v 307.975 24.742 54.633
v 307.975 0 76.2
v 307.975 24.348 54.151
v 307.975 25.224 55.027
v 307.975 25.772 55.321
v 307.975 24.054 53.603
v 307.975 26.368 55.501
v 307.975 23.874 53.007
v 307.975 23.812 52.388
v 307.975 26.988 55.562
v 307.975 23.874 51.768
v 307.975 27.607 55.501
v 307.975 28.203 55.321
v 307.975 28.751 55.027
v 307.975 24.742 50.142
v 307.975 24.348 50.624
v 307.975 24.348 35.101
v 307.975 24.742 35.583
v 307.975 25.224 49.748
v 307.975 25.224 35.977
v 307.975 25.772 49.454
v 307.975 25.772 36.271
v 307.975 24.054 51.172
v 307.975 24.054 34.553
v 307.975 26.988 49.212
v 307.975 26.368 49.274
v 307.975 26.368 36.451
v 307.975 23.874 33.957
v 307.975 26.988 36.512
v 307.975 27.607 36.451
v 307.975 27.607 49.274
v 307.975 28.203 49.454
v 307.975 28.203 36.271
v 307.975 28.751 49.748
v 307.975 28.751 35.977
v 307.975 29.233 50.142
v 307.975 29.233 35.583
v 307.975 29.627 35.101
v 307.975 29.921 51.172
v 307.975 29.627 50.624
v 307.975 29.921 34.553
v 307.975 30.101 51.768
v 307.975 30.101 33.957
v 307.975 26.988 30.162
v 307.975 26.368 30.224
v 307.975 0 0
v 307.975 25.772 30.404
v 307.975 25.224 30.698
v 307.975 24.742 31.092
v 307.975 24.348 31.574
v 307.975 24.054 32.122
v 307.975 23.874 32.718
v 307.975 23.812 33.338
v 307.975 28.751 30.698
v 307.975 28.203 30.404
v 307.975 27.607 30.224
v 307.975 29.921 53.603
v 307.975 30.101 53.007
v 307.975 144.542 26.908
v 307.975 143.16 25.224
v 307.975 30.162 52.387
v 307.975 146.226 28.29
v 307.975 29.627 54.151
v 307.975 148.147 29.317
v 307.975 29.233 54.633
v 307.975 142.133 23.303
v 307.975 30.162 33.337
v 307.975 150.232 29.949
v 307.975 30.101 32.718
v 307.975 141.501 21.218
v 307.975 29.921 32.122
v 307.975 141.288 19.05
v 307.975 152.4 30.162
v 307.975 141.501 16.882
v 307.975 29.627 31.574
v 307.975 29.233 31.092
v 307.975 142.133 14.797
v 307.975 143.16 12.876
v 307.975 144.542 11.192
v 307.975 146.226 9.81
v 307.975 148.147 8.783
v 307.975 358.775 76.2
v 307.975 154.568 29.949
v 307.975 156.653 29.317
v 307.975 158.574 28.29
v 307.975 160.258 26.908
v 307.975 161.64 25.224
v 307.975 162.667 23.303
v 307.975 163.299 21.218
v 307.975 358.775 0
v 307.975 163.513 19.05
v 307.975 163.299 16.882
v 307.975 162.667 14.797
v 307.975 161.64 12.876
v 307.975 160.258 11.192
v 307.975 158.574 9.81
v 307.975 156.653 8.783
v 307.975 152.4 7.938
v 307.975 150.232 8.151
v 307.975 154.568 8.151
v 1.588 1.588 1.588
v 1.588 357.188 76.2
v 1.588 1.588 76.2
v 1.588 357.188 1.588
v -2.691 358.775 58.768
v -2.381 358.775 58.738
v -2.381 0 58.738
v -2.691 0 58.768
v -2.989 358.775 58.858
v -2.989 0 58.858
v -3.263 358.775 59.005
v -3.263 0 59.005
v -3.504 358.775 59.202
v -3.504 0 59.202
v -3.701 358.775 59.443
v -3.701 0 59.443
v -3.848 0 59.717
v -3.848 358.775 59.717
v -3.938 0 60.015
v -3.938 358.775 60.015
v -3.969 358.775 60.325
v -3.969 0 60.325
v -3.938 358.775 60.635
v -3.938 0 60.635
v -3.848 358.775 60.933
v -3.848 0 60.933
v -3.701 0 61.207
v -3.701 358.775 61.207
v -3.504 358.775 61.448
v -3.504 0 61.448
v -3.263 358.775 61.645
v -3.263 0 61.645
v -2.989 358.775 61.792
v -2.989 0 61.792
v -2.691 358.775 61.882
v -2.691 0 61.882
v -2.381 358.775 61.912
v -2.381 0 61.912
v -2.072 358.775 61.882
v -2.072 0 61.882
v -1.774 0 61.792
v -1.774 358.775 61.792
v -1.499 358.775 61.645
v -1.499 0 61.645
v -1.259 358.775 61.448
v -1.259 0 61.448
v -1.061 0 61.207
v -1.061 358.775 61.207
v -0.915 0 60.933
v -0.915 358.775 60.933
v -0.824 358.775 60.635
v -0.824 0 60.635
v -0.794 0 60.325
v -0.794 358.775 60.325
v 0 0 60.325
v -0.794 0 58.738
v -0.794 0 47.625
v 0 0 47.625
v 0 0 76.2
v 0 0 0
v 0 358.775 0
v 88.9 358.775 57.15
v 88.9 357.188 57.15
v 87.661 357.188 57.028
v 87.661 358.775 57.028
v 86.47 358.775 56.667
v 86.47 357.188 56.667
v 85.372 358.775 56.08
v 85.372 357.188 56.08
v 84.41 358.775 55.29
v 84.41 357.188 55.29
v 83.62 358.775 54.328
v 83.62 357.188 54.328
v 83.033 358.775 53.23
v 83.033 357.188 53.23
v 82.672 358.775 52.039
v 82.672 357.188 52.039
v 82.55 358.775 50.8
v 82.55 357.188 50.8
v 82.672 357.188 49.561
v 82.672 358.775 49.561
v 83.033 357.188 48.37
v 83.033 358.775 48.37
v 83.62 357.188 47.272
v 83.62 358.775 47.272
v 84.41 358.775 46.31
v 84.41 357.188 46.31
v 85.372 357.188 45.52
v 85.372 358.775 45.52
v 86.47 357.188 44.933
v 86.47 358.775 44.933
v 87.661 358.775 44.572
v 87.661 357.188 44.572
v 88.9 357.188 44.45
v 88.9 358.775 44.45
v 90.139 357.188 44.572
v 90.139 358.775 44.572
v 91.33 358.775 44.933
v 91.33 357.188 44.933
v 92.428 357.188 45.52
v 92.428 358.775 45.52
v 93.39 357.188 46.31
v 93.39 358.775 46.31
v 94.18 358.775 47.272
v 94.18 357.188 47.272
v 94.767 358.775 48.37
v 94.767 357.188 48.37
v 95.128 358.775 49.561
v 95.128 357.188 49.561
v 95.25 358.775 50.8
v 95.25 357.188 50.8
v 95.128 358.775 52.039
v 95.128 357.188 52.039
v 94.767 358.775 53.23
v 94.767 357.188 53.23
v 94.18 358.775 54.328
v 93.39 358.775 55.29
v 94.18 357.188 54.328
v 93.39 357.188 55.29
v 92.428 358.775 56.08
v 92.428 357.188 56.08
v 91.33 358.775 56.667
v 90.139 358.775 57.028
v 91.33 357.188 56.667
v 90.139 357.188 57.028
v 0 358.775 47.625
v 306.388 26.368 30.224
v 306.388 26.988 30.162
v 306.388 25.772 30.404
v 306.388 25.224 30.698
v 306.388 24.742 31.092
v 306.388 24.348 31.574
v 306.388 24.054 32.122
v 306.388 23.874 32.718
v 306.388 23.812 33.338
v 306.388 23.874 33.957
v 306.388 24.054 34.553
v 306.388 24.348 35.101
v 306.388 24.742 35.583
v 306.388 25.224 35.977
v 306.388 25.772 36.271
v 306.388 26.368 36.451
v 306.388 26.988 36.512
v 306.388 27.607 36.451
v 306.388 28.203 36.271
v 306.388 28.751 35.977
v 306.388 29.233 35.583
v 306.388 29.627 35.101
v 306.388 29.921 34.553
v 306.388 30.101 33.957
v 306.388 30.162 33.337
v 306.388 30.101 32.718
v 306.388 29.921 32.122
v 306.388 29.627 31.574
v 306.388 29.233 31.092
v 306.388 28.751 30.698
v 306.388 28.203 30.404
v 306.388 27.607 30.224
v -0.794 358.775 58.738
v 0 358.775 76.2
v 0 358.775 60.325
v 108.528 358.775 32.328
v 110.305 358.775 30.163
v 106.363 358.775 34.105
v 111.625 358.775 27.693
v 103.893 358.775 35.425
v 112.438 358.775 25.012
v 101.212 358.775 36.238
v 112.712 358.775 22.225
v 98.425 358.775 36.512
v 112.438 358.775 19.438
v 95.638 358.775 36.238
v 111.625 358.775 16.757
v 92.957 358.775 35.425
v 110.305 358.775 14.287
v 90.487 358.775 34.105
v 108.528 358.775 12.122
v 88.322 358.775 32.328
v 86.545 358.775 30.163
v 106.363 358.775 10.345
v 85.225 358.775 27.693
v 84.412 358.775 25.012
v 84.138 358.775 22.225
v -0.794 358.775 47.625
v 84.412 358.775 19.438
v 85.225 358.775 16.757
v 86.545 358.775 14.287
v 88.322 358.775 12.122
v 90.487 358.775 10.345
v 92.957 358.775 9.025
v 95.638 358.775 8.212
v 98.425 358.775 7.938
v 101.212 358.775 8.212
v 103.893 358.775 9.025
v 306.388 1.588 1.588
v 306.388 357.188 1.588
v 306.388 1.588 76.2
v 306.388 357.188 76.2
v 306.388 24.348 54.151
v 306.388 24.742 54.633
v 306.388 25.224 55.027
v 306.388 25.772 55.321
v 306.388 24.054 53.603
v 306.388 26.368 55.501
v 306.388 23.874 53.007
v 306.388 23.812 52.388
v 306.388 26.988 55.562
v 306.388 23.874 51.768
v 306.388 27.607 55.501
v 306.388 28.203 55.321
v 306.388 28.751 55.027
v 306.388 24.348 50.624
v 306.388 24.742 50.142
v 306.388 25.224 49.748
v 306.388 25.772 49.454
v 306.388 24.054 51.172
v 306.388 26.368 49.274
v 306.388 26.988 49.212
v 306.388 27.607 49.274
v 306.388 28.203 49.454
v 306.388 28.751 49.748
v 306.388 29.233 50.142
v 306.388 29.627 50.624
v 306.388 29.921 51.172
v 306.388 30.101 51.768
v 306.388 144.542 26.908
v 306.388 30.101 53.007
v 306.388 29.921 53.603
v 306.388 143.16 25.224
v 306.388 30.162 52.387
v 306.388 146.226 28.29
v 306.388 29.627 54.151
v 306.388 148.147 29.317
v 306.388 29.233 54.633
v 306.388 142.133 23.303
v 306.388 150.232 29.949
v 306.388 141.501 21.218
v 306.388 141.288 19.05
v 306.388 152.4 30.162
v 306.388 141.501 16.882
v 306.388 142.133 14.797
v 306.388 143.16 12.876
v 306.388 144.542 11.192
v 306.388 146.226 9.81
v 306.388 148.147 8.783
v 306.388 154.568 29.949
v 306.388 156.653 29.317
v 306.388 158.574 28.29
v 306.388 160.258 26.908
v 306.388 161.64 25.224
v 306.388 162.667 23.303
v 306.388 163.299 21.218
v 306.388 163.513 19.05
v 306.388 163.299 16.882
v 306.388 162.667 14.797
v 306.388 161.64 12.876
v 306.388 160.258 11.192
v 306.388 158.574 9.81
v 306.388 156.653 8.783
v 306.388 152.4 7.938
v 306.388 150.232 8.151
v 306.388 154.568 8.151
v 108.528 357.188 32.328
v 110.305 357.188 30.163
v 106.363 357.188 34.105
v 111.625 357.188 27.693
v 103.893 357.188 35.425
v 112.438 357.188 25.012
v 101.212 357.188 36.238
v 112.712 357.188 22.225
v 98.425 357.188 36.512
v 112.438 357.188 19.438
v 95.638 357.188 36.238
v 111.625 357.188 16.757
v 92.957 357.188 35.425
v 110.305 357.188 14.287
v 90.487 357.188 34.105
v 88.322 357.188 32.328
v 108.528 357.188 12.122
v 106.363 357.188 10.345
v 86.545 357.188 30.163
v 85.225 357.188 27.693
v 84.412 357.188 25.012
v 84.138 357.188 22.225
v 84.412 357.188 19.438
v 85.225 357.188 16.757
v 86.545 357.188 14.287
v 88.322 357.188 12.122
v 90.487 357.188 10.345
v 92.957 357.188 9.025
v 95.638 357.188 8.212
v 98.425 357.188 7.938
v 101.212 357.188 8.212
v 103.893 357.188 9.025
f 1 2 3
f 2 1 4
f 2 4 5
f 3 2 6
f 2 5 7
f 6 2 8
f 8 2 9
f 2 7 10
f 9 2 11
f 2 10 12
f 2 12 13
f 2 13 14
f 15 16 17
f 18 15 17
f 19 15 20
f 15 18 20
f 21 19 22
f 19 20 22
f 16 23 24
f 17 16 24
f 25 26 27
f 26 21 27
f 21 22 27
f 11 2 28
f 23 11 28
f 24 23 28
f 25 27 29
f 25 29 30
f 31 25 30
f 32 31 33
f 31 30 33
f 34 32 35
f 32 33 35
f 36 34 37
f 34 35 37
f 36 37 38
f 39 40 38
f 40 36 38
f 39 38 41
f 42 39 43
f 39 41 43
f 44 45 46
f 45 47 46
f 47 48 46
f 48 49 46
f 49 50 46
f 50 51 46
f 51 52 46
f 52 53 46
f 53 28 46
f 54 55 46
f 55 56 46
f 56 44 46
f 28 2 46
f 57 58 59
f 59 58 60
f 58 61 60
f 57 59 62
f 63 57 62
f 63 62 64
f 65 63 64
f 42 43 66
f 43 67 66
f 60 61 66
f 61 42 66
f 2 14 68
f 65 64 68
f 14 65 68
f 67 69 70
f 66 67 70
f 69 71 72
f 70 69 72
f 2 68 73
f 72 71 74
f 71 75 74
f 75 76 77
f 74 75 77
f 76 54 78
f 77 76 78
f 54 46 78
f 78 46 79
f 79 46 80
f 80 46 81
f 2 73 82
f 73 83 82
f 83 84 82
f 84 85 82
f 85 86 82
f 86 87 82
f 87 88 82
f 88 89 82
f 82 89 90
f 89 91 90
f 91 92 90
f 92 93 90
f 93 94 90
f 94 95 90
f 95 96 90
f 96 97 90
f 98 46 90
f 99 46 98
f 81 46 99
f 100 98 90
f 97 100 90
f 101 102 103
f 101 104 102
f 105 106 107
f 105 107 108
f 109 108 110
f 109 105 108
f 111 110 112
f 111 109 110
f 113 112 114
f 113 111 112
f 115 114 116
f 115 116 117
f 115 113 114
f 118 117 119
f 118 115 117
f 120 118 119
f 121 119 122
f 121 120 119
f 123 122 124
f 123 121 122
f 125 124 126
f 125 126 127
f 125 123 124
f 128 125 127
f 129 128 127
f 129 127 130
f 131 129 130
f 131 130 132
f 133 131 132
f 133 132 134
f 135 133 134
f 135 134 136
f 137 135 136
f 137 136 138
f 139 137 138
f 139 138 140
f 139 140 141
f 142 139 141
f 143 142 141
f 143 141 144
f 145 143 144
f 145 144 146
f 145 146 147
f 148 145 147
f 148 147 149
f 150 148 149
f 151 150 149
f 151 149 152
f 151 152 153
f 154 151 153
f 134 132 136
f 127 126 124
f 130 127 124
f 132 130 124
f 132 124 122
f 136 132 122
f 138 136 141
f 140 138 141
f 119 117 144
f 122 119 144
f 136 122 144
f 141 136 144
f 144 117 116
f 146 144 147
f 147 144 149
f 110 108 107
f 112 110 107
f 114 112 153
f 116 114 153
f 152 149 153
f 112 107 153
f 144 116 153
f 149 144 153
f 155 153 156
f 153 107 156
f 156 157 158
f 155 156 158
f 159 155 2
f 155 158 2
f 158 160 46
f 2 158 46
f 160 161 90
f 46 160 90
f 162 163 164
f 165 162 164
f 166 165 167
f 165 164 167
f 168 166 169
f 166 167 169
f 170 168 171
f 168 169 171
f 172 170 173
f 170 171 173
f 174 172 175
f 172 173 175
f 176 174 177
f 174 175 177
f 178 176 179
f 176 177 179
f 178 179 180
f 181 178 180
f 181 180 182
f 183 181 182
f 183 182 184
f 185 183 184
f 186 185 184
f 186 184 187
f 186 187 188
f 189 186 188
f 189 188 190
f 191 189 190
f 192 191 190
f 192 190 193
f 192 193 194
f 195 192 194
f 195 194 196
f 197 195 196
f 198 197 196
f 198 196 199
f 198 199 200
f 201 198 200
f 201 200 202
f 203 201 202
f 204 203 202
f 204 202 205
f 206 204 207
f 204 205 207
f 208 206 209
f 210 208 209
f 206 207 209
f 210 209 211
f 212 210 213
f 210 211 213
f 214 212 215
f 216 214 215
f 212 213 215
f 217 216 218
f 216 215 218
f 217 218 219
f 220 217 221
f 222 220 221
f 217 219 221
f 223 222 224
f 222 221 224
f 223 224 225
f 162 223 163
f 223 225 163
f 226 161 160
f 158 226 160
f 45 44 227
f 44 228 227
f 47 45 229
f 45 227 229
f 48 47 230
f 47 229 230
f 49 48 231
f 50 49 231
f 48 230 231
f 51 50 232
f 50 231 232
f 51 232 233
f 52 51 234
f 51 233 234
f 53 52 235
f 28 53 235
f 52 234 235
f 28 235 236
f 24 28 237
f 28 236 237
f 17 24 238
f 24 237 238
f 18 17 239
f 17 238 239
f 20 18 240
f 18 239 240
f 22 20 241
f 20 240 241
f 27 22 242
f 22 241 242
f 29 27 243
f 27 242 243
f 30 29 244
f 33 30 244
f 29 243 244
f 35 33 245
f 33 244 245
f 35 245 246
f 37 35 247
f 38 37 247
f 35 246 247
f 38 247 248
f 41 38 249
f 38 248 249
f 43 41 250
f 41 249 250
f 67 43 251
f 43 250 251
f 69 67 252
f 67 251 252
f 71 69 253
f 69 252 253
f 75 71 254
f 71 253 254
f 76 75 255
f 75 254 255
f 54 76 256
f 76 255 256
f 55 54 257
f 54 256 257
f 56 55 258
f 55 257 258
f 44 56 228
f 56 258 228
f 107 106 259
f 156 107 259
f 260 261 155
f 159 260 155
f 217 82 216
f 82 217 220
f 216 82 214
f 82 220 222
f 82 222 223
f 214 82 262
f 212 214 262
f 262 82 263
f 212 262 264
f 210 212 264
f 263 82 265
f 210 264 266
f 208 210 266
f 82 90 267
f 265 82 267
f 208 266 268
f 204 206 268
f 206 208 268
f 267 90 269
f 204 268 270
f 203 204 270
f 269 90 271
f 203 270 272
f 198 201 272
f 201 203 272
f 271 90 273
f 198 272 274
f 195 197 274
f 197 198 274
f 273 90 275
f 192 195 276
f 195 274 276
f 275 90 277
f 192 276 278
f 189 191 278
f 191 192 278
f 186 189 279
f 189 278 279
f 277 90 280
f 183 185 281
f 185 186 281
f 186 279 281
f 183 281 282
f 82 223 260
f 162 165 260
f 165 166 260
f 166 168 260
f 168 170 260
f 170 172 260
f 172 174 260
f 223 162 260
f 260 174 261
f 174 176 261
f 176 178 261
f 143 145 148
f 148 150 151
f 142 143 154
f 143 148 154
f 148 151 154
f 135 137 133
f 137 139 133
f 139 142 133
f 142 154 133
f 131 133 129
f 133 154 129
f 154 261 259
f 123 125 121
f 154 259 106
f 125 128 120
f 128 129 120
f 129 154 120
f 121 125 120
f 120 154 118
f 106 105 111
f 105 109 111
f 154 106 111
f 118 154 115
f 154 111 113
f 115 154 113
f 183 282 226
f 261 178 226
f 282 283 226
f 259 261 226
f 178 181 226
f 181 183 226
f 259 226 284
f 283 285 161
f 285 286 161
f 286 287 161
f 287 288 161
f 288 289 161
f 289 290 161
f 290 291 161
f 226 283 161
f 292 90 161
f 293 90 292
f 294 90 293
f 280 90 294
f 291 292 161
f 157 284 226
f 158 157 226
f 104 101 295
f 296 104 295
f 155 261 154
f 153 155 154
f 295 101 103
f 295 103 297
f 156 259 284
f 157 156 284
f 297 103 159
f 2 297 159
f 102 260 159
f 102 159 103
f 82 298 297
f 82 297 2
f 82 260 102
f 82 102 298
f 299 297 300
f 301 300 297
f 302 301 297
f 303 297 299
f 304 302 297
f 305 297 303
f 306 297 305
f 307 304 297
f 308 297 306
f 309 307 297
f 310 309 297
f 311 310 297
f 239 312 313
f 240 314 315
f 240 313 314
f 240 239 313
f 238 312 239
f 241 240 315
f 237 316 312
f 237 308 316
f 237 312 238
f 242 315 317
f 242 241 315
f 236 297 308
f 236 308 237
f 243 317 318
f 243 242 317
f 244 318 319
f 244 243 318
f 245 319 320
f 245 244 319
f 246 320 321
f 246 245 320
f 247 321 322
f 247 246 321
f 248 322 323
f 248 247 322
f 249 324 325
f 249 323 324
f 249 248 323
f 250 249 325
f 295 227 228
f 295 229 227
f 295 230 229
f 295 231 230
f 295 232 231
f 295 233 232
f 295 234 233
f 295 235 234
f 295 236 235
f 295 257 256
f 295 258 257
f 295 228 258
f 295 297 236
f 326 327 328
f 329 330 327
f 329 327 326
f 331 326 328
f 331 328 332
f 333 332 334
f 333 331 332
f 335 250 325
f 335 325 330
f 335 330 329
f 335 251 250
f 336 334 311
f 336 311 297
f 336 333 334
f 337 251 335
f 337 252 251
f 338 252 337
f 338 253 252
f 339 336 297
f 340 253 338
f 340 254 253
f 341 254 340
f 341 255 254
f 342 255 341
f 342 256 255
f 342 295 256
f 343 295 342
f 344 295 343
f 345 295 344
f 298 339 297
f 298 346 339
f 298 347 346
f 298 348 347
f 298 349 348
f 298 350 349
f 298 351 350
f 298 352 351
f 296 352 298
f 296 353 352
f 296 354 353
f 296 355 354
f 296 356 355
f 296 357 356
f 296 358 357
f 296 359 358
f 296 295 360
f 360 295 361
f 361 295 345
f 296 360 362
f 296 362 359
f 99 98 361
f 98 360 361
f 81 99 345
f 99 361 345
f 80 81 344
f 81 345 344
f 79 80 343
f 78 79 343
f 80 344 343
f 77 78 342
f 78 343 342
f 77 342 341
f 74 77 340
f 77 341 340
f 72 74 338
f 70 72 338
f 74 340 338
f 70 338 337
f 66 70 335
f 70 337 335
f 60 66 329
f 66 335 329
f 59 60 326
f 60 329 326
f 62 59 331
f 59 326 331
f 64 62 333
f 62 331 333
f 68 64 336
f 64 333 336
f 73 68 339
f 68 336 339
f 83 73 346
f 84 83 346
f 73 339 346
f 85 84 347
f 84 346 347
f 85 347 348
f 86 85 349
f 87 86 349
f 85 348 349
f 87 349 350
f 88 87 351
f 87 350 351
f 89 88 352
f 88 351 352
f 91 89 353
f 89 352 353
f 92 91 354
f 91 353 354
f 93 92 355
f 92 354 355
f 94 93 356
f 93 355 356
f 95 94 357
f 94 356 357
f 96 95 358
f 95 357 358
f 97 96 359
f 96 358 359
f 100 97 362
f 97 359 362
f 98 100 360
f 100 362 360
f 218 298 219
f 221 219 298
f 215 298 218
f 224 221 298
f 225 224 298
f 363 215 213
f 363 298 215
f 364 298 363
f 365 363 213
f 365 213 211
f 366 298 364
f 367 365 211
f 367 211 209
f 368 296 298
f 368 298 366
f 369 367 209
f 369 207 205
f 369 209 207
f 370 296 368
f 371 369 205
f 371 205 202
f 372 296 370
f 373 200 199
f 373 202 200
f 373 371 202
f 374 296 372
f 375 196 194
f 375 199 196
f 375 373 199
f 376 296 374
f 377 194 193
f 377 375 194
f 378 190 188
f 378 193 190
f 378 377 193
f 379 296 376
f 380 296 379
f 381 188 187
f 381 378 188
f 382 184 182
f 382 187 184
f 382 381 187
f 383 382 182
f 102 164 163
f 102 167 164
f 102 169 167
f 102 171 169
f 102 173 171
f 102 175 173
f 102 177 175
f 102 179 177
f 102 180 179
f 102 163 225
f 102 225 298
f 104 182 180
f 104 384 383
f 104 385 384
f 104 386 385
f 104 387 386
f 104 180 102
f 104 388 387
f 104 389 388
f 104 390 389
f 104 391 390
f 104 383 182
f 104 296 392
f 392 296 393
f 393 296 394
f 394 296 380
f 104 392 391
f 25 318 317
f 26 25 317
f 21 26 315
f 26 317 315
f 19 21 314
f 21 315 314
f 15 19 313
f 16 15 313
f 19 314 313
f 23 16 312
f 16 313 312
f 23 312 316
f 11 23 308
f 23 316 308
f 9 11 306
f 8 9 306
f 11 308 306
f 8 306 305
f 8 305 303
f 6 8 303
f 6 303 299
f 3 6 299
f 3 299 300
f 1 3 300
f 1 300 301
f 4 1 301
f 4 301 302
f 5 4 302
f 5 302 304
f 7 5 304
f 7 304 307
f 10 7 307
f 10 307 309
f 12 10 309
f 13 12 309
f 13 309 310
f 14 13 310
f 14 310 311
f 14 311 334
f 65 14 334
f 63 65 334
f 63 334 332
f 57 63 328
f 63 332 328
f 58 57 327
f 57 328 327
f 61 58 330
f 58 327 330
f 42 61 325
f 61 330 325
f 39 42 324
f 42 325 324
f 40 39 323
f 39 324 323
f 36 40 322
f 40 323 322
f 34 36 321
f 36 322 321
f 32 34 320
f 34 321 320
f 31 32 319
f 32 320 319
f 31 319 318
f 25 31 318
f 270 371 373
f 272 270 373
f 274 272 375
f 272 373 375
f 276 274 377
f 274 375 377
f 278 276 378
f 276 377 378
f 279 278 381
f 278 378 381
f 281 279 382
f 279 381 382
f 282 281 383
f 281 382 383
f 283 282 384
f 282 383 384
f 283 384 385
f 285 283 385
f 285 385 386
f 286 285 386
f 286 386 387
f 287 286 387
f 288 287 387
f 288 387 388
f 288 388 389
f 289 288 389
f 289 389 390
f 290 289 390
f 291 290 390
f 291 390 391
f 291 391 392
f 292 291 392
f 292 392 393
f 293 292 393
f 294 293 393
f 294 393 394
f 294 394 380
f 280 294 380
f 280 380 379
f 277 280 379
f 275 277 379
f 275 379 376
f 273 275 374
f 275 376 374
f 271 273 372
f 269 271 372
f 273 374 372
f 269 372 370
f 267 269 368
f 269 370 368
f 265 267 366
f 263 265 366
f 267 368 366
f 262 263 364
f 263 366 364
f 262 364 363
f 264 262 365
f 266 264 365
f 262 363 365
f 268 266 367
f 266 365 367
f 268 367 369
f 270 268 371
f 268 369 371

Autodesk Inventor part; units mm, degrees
ref_plane "YZ Plane" through (0, 0, 0) normal (1, 0, 0) x (0, 1, 0)
ref_plane "XZ Plane" through (0, 0, 0) normal (0, 1, 0) x (-1, 0, 0)
ref_plane "XY Plane" through (0, 0, 0) normal (0, 0, 1) x (1, 0, 0)
sketch "Sketch1" plane through (0, 0, 0) normal (0, 0, 1) x (1, 0, 0)
  line L0 (0, 0) -> (307.975, 0)
  line L1 (307.975, 0) -> (307.975, 358.775)
  line L2 (307.975, 358.775) -> (0, 358.775)
  line L3 (0, 358.775) -> (0, 0)
  dimension "d0" = 307.975
  dimension "d1" = 358.775
extrude "Extrusion1" add sketch "Sketch1" along normal blind 76.2
shell "Shell1" thickness 1.5875 removed faces 1 at (205.3167, 119.5917, 76.2)
sketch "Sketch2" plane through (0, 358.775, 0) normal (0, 1, 0) x (1, 0, 0)
  line L0 (0, -76.2) -> (0, -60.325) construction
  line L1 (0, -60.325) -> (-3.175, -60.325) construction
  arc A0 (-2.3813, -58.7375) -> (-0.7938, -60.325) centre (-2.3813, -60.325) ccw
  line L2 (0, -60.325) -> (-0.7938, -60.325)
  line L3 (-0.7938, -58.7375) -> (-0.7938, -47.625)
  line L4 (-0.7938, -47.625) -> (0, -47.625)
  line L5 (0, -47.625) -> (0, -60.325)
  line L6 (-2.3813, -58.7375) -> (-0.7938, -58.7375)
  point P0 (0, 0)
  dimension "d10" = 15.875
  dimension "d11" = 3.175
  dimension "d12" = 3.175
  dimension "d13" = 12.7
extrude "Extrusion2" add sketch "Sketch2" against normal up to surface (358.775 mm away)
sketch "Sketch3" plane through (307.975, 0, 0) normal (1, 0, 0) x (0, 0, -1)
  line L0 (0, 358.775) -> (0, 0) construction
  line L1 (0, 0) -> (-19.05, 0) construction
  line L2 (-19.05, 0) -> (-19.05, 152.4) construction
  line L3 (-19.05, 152.4) -> (0, 152.4) construction
  line L4 (0, 152.4) -> (0, 0) construction
  dimension "d14" = 19.05
  dimension "d15" = 152.4
hole "Hole1" at (307.975, 152.4, 19.05) direction (-1, 0, 0) diameter 22.225 depth 25.4 tip angle 118
sketch "Sketch4" plane through (307.975, 0, 0) normal (1, 0, 0) x (0, 0, -1)
  line L0 (-1.5875, 357.1875) -> (-1.5875, 1.5875) construction
  line L1 (-1.5875, 1.5875) -> (-1.5875, 26.9875) construction
  line L2 (-1.5875, 26.9875) -> (-33.3375, 26.9875) construction
  line L3 (-1.5875, 26.9875) -> (-52.3875, 26.9875) construction
  point P0 (0, 0)
  dimension "d23" = 25.4
  dimension "d24" = 31.75
  dimension "d25" = 50.8
hole "Hole2" at (307.975, 26.9875, 52.3875) at (307.975, 26.9875, 33.3375) direction (-1, 0, 0) diameter 6.35 depth 25.4 tip angle 118
sketch "Sketch5" plane through (0, 358.775, 0) normal (0, 1, 0) x (1, 0, 0)
  line L0 (0, 0) -> (307.975, 0) projected
  line L1 (0, 0) -> (98.425, 0)
  line L2 (98.425, 0) -> (98.425, -22.225)
  dimension "d33" = 98.425
  dimension "d34" = 22.225
hole "Hole3" at (98.425, 358.775, 22.225) direction (0, -1, 0) diameter 28.575 depth 25.4 tip angle 118
sketch "Sketch6" plane through (0, 358.775, 0) normal (0, 1, 0) x (1, 0, 0)
  line L0 (0, -76.2) -> (307.975, -76.2) construction
  line L1 (0, -76.2) -> (88.9, -76.2) construction
  line L2 (88.9, -76.2) -> (88.9, -50.8) construction
  line L3 (88.9, -50.8) -> (0, -50.8) construction
  line L4 (0, -50.8) -> (0, -76.2) construction
  point P0 (0, 0)
  dimension "d42" = 88.9
  dimension "d43" = 25.4
hole "Hole4" at (88.9, 358.775, 50.8) direction (0, -1, 0) diameter 12.7 depth 25.4 tip angle 118
properties part number "case" material "Steel"
